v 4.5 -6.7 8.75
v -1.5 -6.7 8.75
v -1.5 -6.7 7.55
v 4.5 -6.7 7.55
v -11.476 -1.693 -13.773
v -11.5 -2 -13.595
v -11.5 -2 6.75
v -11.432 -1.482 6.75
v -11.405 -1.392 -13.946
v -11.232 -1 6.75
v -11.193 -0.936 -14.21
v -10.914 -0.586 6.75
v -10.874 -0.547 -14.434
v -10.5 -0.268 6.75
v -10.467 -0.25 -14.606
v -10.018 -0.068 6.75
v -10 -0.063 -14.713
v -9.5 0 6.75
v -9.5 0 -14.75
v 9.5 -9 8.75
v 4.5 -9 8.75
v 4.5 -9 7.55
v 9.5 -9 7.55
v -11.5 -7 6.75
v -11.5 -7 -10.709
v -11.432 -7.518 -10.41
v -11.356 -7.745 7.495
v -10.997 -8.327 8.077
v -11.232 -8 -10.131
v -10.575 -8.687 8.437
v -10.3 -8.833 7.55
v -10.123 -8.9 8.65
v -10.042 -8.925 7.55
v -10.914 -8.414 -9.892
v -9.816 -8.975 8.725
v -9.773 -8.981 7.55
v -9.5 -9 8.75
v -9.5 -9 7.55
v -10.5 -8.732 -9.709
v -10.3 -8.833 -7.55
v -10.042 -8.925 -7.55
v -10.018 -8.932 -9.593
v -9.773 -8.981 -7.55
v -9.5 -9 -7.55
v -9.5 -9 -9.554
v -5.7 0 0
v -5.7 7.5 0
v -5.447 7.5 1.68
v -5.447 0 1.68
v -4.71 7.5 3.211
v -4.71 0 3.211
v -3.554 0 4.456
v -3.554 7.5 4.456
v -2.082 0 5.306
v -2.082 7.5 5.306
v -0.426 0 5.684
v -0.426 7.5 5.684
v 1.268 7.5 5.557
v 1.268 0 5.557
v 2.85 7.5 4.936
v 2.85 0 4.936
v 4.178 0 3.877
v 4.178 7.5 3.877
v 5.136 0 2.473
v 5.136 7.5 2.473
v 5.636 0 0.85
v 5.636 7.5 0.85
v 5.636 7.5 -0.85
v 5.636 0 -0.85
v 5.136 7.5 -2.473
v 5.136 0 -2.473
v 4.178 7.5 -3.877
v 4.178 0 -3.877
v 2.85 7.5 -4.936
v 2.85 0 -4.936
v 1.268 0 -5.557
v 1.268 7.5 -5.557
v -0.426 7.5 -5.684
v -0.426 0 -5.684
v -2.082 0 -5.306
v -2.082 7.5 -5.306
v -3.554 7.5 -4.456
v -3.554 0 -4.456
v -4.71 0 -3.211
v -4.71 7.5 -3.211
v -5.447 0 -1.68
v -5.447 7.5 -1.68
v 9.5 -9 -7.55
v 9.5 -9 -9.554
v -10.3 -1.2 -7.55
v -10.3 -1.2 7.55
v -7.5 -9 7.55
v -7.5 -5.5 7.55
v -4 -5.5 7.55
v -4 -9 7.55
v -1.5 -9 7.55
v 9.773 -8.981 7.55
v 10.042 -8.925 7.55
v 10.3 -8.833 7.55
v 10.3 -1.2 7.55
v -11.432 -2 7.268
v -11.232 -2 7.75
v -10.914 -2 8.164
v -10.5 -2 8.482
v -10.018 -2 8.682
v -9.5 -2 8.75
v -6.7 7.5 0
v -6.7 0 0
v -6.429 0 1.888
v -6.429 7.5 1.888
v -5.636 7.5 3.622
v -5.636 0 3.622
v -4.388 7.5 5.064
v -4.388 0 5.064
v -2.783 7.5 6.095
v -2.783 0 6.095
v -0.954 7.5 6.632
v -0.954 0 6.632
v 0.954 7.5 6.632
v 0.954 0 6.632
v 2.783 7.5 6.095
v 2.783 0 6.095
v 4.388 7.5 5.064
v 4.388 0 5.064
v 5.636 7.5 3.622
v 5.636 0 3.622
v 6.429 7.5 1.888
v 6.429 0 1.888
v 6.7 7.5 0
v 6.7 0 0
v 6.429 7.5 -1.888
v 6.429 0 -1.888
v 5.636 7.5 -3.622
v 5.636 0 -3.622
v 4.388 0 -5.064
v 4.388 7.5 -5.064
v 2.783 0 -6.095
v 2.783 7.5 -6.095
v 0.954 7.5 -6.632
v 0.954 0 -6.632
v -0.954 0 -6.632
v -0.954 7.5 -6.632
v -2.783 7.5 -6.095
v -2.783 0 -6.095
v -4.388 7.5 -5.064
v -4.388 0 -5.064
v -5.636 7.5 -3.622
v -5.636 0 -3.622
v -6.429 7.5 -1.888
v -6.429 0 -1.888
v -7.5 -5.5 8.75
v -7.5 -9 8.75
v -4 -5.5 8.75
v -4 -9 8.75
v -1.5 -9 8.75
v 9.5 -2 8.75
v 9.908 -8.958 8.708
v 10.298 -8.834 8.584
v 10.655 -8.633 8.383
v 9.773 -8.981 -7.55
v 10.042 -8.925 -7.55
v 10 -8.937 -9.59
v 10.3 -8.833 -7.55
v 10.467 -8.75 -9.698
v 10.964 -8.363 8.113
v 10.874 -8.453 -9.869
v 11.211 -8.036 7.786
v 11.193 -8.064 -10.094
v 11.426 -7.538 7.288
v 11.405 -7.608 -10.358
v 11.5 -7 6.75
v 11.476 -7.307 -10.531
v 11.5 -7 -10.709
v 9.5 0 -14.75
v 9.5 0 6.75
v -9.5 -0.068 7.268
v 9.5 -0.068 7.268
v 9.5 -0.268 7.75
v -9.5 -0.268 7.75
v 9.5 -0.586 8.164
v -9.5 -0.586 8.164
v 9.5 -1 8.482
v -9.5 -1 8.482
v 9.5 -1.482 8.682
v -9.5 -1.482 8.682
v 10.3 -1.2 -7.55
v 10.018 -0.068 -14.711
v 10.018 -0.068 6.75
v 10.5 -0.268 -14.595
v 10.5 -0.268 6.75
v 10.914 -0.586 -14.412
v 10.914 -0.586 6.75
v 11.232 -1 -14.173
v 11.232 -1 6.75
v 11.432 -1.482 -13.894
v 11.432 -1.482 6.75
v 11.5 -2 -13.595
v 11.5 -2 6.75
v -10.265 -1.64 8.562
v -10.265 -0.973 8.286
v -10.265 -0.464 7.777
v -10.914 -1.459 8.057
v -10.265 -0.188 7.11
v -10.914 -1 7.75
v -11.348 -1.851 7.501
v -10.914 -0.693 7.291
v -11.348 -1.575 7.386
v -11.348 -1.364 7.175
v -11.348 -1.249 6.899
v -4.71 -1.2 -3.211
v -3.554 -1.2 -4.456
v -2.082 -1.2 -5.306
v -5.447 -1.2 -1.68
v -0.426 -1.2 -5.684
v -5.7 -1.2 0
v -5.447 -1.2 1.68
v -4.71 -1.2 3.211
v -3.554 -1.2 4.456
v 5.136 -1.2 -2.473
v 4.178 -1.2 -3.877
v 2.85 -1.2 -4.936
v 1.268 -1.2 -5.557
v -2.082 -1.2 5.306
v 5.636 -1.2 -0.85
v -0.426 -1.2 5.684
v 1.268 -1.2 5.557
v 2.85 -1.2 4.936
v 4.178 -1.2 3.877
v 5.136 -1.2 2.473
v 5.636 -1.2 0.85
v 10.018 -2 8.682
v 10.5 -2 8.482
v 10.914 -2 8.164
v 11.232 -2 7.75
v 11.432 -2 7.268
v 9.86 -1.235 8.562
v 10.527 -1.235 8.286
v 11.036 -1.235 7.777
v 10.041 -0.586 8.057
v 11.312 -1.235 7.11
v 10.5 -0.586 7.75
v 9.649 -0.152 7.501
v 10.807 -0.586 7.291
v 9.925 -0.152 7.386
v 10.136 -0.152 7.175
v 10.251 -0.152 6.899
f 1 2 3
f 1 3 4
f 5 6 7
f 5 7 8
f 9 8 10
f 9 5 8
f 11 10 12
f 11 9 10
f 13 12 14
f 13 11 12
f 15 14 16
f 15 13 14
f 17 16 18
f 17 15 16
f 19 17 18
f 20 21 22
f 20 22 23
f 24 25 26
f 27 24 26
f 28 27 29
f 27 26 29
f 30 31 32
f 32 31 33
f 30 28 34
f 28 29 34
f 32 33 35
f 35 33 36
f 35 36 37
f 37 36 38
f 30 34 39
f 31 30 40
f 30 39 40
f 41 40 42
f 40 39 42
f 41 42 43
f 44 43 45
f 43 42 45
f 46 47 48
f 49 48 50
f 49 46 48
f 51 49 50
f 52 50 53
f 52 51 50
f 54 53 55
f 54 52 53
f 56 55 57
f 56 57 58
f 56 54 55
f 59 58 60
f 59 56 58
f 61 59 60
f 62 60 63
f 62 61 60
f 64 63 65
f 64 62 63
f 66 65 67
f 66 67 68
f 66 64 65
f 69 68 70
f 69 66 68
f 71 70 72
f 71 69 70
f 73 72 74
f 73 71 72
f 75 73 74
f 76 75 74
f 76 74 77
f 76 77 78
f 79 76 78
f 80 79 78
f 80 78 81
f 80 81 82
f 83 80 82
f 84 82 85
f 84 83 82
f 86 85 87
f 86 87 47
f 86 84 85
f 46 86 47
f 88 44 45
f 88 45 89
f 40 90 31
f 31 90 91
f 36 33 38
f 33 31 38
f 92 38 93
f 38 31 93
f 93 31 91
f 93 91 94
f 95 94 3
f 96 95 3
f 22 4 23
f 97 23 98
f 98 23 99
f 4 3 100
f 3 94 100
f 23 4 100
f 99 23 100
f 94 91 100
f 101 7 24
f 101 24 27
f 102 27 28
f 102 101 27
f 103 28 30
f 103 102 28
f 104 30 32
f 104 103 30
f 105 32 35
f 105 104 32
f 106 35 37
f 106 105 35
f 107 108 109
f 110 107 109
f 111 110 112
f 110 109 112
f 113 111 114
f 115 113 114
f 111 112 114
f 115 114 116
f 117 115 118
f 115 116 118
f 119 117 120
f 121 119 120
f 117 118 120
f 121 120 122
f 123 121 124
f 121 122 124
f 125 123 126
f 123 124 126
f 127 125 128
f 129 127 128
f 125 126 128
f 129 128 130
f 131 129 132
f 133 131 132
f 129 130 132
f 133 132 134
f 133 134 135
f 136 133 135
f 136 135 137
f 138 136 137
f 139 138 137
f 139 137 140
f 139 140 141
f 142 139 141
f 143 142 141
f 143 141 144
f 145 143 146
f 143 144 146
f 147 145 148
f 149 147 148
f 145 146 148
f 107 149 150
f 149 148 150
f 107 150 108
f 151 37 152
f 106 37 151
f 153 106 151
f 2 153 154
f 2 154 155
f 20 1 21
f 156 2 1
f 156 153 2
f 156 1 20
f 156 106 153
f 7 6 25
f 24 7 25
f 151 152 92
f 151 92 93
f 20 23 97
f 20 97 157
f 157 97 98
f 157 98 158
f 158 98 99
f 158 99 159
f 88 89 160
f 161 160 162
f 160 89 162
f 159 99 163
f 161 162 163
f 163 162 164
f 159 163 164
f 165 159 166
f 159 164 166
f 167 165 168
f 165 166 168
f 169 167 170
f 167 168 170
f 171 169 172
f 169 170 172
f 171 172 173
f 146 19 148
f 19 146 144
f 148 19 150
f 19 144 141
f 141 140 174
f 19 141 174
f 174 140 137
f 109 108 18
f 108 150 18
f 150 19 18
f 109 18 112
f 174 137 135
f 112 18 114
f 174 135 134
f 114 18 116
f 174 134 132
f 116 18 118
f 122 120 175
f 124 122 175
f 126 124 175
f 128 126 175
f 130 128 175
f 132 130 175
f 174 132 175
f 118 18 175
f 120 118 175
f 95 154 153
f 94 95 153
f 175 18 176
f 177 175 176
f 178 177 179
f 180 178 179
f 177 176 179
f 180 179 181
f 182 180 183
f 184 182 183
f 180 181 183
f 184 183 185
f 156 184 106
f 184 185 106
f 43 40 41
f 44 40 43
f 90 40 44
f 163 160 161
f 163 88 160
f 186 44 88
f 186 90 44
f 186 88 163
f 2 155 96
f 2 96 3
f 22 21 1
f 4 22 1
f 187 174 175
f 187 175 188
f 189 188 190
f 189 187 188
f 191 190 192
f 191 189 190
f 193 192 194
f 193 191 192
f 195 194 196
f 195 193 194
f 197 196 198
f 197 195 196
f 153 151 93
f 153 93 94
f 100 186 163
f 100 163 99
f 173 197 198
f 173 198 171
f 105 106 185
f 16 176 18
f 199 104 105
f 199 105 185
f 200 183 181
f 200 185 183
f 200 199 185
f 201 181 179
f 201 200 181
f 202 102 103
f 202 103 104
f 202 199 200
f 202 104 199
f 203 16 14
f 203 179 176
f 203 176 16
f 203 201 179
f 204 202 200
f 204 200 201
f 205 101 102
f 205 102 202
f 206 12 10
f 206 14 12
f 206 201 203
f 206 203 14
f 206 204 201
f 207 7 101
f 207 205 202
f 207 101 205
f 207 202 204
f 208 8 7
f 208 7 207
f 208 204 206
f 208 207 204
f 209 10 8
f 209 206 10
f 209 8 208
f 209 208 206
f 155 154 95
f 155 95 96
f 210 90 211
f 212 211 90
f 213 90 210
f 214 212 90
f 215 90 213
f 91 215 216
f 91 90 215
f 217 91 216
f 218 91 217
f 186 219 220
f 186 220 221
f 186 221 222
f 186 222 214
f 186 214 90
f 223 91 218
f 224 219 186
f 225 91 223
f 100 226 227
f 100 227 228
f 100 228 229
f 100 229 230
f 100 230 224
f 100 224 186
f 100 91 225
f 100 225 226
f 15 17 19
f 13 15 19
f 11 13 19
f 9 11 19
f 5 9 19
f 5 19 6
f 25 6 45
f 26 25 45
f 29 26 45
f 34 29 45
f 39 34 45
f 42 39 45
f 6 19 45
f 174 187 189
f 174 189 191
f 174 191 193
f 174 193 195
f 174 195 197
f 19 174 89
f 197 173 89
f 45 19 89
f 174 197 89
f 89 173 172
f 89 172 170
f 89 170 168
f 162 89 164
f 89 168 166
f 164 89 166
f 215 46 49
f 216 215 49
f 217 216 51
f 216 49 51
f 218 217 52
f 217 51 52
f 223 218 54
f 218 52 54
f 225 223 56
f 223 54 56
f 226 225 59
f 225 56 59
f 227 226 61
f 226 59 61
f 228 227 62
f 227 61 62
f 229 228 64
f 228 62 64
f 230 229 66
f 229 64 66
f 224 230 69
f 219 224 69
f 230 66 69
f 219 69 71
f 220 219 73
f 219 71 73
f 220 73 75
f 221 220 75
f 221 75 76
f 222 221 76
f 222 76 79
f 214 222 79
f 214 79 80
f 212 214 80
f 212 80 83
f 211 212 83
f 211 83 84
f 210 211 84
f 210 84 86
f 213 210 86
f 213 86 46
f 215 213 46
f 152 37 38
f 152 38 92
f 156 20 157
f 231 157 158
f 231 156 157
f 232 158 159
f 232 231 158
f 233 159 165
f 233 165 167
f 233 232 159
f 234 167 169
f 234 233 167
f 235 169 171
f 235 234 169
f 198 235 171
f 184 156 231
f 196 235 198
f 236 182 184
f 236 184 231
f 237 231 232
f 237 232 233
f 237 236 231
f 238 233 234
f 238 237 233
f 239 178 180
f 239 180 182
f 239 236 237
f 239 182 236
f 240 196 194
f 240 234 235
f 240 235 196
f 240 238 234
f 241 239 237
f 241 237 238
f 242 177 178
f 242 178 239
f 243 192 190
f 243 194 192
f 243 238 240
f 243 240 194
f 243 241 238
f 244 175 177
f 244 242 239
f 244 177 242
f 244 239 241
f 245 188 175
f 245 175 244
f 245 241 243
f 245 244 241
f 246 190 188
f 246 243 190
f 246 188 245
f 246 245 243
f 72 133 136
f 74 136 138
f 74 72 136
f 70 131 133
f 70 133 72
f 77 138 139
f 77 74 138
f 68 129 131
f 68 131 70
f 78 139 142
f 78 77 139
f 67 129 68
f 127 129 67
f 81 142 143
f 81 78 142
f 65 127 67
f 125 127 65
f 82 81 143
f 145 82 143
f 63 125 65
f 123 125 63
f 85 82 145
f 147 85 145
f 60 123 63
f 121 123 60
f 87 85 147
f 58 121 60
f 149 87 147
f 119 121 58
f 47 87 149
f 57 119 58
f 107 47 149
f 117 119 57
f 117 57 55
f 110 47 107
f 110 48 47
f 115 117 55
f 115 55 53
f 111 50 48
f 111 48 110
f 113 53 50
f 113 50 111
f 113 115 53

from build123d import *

# Parameters (mm, degrees)
F0_W          = 23
F0_H          = 17.5
F1_DEPTH      = 9
F2_T          = -1.2
F3_R          = 5.7
F4_DEPTH      = 3
F3_R_2        = 6.7
F5_DEPTH      = 7.5
F6_W          = 6
F6_H          = 2.3
F6_W_2        = 3.5
F6_H_2        = 3.5
F7_DEPTH      = 4
F8_DEPTH      = 6
F10_DEPTH     = 30
F11_T1_DEPTH  = 19
F11_T3_DEPTH  = 26.5
F11_T5_DEPTH  = 12
F11_T7_DEPTH  = 28.3038475773
F11_S11_W     = 2
F11_S11_H     = 2
F11_T12_DEPTH = 2
F11_S17_W     = 2
F11_S17_H     = 2
F11_T18_DEPTH = 2


# Not quite as in the source:
# - a fillet or chamfer that OpenCascade refuses, or shapes differently, is made with other operations: its cross-section is extruded or revolved along the edge and cut away or added


with BuildPart() as f1:
    # F0 (on Front) → F1 (new body)
    with BuildSketch(Plane.XZ):
        Rectangle(F0_W, F0_H)
    extrude(amount=F1_DEPTH)

    # F2
    f2_openings = [f1.faces().sort_by_distance(p)[0] for p in [
        (0, -9, 0),
    ]]
    offset(amount=F2_T, openings=f2_openings)

    # F3 (on face) → F4 (cut)
    with BuildSketch(Plane(origin=(0, 0, 0), x_dir=(-1, 0, 0), z_dir=(0, 1, 0))):
        Circle(F3_R)
    extrude(amount=-F4_DEPTH, mode=Mode.SUBTRACT)

    # F3 (on face) → F5 (join)
    with BuildSketch(Plane(origin=(0, 0, 0), x_dir=(-1, 0, 0), z_dir=(0, 1, 0))):
        Circle(F3_R_2)
        Circle(F3_R, mode=Mode.SUBTRACT)
    extrude(amount=F5_DEPTH)

    # F6 (on face) → F7 (cut)
    with BuildSketch(Plane.XY.offset(8.75)):
        with Locations((1.5, -7.85)):
            Rectangle(F6_W, F6_H)
        with Locations((-5.75, -7.25)):
            Rectangle(F6_W_2, F6_H_2)
    extrude(amount=-F7_DEPTH, mode=Mode.SUBTRACT)

    # F8 (add): a face of the model
    f8_faces = [f1.faces().sort_by_distance(p)[0] for p in [
        (0, -4.5, -8.75),
    ]]
    extrude(f8_faces, amount=F8_DEPTH)

    # F9 (on face) → F10 (cut)
    with BuildSketch(Plane.YZ.offset(11.5)):
        Polygon((-9, -14.75), (0, -14.75), (-9, -9.5538475773), align=None)
    extrude(amount=-F10_DEPTH, mode=Mode.SUBTRACT)

    # F11: fillet of radius 2 on 7 edges, made by hand

    # F11_s2 → F11_t1 (cut)
    with BuildSketch(Plane.YZ.offset(-9.5)):
        with BuildLine():
            ThreePointArc((0, 6.75), (-0.5857864376, 8.1642135624), (-2, 8.75))
            Line((-2, 8.75), (0, 8.75))
            Line((0, 8.75), (0, 6.75))
        make_face()
    extrude(amount=F11_T1_DEPTH, mode=Mode.SUBTRACT)

    # F11_s4 → F11_t3 (cut)
    with BuildSketch(Plane.XY.offset(-19.75)):
        with BuildLine():
            ThreePointArc((-11.5, -2), (-10.9142135624, -0.5857864376), (-9.5, 0))
            Line((-9.5, 0), (-11.5, 0))
            Line((-11.5, 0), (-11.5, -2))
        make_face()
        with BuildLine():
            ThreePointArc((9.5, 0), (10.9142135624, -0.5857864376), (11.5, -2))
            Line((11.5, -2), (11.5, 0))
            Line((11.5, 0), (9.5, 0))
        make_face()
    extrude(amount=F11_T3_DEPTH, mode=Mode.SUBTRACT)

    # F11_s6 → F11_t5 (cut)
    with BuildSketch(Plane.XZ.offset(2)):
        with BuildLine():
            ThreePointArc((9.5, 8.75), (10.9142135624, 8.1642135624), (11.5, 6.75))
            Line((11.5, 6.75), (11.5, 8.75))
            Line((11.5, 8.75), (9.5, 8.75))
        make_face()
        with BuildLine():
            ThreePointArc((-11.5, 6.75), (-10.9142135624, 8.1642135624), (-9.5, 8.75))
            Line((-9.5, 8.75), (-11.5, 8.75))
            Line((-11.5, 8.75), (-11.5, 6.75))
        make_face()
    extrude(amount=F11_T5_DEPTH, mode=Mode.SUBTRACT)

    # F11_s8 → F11_t7 (cut)
    with BuildSketch(Plane.XY.offset(-14.5538475773)):
        with BuildLine():
            ThreePointArc((-11.5, -7), (-10.9142135624, -8.4142135624), (-9.5, -9))
            Line((-9.5, -9), (-11.5, -9))
            Line((-11.5, -9), (-11.5, -7))
        make_face()
        with BuildLine():
            ThreePointArc((9.5, -9), (10.9142135624, -8.4142135624), (11.5, -7))
            Line((11.5, -7), (11.5, -9))
            Line((11.5, -9), (9.5, -9))
        make_face()
    extrude(amount=F11_T7_DEPTH, mode=Mode.SUBTRACT)


with BuildPart() as f11_tool10:
    # F11_s11 → F11_t12 (new body)
    with BuildSketch(Plane.XZ.offset(2)):
        with Locations((10.5, 7.75)):
            Rectangle(F11_S11_W, F11_S11_H)
    extrude(amount=-F11_T12_DEPTH)

    # F11_s13 → F11_t14 (revolve, cut)
    with BuildSketch(Plane(origin=(9.5, -2, 6.75), x_dir=(-0.7071067812, 0, -0.7071067812), z_dir=(0.7071067812, 0, -0.7071067812))):
        with BuildLine():
            ThreePointArc((0, -2), (2, 0), (0, 2))
            Line((0, 2), (0, -2))
        make_face()
    revolve(axis=Axis((9.5, -2, 6.75), (0, 1, 0)), mode=Mode.SUBTRACT)


with BuildPart() as f1_1:
    add(f1.part)

    # F11_t9: cut F11_tool10
    add(f11_tool10.part, mode=Mode.SUBTRACT)


with BuildPart() as f11_tool16:
    # F11_s17 → F11_t18 (new body)
    with BuildSketch(Plane.YZ.offset(-9.5)):
        with Locations((-1, 7.75)):
            Rectangle(F11_S17_W, F11_S17_H)
    extrude(amount=-F11_T18_DEPTH)

    # F11_s19 → F11_t20 (revolve, cut)
    with BuildSketch(Plane(origin=(-9.5, -2, 6.75), x_dir=(0, -0.7071067812, -0.7071067812), z_dir=(0, 0.7071067812, -0.7071067812))):
        with BuildLine():
            ThreePointArc((0, -2), (2, 0), (0, 2))
            Line((0, 2), (0, -2))
        make_face()
    revolve(axis=Axis((-9.5, -2, 6.75), (-1, 0, 0)), mode=Mode.SUBTRACT)


with BuildPart() as f1_2:
    add(f1_1.part)

    # F11_t15: cut F11_tool16
    add(f11_tool16.part, mode=Mode.SUBTRACT)


solid = f1_2.part
